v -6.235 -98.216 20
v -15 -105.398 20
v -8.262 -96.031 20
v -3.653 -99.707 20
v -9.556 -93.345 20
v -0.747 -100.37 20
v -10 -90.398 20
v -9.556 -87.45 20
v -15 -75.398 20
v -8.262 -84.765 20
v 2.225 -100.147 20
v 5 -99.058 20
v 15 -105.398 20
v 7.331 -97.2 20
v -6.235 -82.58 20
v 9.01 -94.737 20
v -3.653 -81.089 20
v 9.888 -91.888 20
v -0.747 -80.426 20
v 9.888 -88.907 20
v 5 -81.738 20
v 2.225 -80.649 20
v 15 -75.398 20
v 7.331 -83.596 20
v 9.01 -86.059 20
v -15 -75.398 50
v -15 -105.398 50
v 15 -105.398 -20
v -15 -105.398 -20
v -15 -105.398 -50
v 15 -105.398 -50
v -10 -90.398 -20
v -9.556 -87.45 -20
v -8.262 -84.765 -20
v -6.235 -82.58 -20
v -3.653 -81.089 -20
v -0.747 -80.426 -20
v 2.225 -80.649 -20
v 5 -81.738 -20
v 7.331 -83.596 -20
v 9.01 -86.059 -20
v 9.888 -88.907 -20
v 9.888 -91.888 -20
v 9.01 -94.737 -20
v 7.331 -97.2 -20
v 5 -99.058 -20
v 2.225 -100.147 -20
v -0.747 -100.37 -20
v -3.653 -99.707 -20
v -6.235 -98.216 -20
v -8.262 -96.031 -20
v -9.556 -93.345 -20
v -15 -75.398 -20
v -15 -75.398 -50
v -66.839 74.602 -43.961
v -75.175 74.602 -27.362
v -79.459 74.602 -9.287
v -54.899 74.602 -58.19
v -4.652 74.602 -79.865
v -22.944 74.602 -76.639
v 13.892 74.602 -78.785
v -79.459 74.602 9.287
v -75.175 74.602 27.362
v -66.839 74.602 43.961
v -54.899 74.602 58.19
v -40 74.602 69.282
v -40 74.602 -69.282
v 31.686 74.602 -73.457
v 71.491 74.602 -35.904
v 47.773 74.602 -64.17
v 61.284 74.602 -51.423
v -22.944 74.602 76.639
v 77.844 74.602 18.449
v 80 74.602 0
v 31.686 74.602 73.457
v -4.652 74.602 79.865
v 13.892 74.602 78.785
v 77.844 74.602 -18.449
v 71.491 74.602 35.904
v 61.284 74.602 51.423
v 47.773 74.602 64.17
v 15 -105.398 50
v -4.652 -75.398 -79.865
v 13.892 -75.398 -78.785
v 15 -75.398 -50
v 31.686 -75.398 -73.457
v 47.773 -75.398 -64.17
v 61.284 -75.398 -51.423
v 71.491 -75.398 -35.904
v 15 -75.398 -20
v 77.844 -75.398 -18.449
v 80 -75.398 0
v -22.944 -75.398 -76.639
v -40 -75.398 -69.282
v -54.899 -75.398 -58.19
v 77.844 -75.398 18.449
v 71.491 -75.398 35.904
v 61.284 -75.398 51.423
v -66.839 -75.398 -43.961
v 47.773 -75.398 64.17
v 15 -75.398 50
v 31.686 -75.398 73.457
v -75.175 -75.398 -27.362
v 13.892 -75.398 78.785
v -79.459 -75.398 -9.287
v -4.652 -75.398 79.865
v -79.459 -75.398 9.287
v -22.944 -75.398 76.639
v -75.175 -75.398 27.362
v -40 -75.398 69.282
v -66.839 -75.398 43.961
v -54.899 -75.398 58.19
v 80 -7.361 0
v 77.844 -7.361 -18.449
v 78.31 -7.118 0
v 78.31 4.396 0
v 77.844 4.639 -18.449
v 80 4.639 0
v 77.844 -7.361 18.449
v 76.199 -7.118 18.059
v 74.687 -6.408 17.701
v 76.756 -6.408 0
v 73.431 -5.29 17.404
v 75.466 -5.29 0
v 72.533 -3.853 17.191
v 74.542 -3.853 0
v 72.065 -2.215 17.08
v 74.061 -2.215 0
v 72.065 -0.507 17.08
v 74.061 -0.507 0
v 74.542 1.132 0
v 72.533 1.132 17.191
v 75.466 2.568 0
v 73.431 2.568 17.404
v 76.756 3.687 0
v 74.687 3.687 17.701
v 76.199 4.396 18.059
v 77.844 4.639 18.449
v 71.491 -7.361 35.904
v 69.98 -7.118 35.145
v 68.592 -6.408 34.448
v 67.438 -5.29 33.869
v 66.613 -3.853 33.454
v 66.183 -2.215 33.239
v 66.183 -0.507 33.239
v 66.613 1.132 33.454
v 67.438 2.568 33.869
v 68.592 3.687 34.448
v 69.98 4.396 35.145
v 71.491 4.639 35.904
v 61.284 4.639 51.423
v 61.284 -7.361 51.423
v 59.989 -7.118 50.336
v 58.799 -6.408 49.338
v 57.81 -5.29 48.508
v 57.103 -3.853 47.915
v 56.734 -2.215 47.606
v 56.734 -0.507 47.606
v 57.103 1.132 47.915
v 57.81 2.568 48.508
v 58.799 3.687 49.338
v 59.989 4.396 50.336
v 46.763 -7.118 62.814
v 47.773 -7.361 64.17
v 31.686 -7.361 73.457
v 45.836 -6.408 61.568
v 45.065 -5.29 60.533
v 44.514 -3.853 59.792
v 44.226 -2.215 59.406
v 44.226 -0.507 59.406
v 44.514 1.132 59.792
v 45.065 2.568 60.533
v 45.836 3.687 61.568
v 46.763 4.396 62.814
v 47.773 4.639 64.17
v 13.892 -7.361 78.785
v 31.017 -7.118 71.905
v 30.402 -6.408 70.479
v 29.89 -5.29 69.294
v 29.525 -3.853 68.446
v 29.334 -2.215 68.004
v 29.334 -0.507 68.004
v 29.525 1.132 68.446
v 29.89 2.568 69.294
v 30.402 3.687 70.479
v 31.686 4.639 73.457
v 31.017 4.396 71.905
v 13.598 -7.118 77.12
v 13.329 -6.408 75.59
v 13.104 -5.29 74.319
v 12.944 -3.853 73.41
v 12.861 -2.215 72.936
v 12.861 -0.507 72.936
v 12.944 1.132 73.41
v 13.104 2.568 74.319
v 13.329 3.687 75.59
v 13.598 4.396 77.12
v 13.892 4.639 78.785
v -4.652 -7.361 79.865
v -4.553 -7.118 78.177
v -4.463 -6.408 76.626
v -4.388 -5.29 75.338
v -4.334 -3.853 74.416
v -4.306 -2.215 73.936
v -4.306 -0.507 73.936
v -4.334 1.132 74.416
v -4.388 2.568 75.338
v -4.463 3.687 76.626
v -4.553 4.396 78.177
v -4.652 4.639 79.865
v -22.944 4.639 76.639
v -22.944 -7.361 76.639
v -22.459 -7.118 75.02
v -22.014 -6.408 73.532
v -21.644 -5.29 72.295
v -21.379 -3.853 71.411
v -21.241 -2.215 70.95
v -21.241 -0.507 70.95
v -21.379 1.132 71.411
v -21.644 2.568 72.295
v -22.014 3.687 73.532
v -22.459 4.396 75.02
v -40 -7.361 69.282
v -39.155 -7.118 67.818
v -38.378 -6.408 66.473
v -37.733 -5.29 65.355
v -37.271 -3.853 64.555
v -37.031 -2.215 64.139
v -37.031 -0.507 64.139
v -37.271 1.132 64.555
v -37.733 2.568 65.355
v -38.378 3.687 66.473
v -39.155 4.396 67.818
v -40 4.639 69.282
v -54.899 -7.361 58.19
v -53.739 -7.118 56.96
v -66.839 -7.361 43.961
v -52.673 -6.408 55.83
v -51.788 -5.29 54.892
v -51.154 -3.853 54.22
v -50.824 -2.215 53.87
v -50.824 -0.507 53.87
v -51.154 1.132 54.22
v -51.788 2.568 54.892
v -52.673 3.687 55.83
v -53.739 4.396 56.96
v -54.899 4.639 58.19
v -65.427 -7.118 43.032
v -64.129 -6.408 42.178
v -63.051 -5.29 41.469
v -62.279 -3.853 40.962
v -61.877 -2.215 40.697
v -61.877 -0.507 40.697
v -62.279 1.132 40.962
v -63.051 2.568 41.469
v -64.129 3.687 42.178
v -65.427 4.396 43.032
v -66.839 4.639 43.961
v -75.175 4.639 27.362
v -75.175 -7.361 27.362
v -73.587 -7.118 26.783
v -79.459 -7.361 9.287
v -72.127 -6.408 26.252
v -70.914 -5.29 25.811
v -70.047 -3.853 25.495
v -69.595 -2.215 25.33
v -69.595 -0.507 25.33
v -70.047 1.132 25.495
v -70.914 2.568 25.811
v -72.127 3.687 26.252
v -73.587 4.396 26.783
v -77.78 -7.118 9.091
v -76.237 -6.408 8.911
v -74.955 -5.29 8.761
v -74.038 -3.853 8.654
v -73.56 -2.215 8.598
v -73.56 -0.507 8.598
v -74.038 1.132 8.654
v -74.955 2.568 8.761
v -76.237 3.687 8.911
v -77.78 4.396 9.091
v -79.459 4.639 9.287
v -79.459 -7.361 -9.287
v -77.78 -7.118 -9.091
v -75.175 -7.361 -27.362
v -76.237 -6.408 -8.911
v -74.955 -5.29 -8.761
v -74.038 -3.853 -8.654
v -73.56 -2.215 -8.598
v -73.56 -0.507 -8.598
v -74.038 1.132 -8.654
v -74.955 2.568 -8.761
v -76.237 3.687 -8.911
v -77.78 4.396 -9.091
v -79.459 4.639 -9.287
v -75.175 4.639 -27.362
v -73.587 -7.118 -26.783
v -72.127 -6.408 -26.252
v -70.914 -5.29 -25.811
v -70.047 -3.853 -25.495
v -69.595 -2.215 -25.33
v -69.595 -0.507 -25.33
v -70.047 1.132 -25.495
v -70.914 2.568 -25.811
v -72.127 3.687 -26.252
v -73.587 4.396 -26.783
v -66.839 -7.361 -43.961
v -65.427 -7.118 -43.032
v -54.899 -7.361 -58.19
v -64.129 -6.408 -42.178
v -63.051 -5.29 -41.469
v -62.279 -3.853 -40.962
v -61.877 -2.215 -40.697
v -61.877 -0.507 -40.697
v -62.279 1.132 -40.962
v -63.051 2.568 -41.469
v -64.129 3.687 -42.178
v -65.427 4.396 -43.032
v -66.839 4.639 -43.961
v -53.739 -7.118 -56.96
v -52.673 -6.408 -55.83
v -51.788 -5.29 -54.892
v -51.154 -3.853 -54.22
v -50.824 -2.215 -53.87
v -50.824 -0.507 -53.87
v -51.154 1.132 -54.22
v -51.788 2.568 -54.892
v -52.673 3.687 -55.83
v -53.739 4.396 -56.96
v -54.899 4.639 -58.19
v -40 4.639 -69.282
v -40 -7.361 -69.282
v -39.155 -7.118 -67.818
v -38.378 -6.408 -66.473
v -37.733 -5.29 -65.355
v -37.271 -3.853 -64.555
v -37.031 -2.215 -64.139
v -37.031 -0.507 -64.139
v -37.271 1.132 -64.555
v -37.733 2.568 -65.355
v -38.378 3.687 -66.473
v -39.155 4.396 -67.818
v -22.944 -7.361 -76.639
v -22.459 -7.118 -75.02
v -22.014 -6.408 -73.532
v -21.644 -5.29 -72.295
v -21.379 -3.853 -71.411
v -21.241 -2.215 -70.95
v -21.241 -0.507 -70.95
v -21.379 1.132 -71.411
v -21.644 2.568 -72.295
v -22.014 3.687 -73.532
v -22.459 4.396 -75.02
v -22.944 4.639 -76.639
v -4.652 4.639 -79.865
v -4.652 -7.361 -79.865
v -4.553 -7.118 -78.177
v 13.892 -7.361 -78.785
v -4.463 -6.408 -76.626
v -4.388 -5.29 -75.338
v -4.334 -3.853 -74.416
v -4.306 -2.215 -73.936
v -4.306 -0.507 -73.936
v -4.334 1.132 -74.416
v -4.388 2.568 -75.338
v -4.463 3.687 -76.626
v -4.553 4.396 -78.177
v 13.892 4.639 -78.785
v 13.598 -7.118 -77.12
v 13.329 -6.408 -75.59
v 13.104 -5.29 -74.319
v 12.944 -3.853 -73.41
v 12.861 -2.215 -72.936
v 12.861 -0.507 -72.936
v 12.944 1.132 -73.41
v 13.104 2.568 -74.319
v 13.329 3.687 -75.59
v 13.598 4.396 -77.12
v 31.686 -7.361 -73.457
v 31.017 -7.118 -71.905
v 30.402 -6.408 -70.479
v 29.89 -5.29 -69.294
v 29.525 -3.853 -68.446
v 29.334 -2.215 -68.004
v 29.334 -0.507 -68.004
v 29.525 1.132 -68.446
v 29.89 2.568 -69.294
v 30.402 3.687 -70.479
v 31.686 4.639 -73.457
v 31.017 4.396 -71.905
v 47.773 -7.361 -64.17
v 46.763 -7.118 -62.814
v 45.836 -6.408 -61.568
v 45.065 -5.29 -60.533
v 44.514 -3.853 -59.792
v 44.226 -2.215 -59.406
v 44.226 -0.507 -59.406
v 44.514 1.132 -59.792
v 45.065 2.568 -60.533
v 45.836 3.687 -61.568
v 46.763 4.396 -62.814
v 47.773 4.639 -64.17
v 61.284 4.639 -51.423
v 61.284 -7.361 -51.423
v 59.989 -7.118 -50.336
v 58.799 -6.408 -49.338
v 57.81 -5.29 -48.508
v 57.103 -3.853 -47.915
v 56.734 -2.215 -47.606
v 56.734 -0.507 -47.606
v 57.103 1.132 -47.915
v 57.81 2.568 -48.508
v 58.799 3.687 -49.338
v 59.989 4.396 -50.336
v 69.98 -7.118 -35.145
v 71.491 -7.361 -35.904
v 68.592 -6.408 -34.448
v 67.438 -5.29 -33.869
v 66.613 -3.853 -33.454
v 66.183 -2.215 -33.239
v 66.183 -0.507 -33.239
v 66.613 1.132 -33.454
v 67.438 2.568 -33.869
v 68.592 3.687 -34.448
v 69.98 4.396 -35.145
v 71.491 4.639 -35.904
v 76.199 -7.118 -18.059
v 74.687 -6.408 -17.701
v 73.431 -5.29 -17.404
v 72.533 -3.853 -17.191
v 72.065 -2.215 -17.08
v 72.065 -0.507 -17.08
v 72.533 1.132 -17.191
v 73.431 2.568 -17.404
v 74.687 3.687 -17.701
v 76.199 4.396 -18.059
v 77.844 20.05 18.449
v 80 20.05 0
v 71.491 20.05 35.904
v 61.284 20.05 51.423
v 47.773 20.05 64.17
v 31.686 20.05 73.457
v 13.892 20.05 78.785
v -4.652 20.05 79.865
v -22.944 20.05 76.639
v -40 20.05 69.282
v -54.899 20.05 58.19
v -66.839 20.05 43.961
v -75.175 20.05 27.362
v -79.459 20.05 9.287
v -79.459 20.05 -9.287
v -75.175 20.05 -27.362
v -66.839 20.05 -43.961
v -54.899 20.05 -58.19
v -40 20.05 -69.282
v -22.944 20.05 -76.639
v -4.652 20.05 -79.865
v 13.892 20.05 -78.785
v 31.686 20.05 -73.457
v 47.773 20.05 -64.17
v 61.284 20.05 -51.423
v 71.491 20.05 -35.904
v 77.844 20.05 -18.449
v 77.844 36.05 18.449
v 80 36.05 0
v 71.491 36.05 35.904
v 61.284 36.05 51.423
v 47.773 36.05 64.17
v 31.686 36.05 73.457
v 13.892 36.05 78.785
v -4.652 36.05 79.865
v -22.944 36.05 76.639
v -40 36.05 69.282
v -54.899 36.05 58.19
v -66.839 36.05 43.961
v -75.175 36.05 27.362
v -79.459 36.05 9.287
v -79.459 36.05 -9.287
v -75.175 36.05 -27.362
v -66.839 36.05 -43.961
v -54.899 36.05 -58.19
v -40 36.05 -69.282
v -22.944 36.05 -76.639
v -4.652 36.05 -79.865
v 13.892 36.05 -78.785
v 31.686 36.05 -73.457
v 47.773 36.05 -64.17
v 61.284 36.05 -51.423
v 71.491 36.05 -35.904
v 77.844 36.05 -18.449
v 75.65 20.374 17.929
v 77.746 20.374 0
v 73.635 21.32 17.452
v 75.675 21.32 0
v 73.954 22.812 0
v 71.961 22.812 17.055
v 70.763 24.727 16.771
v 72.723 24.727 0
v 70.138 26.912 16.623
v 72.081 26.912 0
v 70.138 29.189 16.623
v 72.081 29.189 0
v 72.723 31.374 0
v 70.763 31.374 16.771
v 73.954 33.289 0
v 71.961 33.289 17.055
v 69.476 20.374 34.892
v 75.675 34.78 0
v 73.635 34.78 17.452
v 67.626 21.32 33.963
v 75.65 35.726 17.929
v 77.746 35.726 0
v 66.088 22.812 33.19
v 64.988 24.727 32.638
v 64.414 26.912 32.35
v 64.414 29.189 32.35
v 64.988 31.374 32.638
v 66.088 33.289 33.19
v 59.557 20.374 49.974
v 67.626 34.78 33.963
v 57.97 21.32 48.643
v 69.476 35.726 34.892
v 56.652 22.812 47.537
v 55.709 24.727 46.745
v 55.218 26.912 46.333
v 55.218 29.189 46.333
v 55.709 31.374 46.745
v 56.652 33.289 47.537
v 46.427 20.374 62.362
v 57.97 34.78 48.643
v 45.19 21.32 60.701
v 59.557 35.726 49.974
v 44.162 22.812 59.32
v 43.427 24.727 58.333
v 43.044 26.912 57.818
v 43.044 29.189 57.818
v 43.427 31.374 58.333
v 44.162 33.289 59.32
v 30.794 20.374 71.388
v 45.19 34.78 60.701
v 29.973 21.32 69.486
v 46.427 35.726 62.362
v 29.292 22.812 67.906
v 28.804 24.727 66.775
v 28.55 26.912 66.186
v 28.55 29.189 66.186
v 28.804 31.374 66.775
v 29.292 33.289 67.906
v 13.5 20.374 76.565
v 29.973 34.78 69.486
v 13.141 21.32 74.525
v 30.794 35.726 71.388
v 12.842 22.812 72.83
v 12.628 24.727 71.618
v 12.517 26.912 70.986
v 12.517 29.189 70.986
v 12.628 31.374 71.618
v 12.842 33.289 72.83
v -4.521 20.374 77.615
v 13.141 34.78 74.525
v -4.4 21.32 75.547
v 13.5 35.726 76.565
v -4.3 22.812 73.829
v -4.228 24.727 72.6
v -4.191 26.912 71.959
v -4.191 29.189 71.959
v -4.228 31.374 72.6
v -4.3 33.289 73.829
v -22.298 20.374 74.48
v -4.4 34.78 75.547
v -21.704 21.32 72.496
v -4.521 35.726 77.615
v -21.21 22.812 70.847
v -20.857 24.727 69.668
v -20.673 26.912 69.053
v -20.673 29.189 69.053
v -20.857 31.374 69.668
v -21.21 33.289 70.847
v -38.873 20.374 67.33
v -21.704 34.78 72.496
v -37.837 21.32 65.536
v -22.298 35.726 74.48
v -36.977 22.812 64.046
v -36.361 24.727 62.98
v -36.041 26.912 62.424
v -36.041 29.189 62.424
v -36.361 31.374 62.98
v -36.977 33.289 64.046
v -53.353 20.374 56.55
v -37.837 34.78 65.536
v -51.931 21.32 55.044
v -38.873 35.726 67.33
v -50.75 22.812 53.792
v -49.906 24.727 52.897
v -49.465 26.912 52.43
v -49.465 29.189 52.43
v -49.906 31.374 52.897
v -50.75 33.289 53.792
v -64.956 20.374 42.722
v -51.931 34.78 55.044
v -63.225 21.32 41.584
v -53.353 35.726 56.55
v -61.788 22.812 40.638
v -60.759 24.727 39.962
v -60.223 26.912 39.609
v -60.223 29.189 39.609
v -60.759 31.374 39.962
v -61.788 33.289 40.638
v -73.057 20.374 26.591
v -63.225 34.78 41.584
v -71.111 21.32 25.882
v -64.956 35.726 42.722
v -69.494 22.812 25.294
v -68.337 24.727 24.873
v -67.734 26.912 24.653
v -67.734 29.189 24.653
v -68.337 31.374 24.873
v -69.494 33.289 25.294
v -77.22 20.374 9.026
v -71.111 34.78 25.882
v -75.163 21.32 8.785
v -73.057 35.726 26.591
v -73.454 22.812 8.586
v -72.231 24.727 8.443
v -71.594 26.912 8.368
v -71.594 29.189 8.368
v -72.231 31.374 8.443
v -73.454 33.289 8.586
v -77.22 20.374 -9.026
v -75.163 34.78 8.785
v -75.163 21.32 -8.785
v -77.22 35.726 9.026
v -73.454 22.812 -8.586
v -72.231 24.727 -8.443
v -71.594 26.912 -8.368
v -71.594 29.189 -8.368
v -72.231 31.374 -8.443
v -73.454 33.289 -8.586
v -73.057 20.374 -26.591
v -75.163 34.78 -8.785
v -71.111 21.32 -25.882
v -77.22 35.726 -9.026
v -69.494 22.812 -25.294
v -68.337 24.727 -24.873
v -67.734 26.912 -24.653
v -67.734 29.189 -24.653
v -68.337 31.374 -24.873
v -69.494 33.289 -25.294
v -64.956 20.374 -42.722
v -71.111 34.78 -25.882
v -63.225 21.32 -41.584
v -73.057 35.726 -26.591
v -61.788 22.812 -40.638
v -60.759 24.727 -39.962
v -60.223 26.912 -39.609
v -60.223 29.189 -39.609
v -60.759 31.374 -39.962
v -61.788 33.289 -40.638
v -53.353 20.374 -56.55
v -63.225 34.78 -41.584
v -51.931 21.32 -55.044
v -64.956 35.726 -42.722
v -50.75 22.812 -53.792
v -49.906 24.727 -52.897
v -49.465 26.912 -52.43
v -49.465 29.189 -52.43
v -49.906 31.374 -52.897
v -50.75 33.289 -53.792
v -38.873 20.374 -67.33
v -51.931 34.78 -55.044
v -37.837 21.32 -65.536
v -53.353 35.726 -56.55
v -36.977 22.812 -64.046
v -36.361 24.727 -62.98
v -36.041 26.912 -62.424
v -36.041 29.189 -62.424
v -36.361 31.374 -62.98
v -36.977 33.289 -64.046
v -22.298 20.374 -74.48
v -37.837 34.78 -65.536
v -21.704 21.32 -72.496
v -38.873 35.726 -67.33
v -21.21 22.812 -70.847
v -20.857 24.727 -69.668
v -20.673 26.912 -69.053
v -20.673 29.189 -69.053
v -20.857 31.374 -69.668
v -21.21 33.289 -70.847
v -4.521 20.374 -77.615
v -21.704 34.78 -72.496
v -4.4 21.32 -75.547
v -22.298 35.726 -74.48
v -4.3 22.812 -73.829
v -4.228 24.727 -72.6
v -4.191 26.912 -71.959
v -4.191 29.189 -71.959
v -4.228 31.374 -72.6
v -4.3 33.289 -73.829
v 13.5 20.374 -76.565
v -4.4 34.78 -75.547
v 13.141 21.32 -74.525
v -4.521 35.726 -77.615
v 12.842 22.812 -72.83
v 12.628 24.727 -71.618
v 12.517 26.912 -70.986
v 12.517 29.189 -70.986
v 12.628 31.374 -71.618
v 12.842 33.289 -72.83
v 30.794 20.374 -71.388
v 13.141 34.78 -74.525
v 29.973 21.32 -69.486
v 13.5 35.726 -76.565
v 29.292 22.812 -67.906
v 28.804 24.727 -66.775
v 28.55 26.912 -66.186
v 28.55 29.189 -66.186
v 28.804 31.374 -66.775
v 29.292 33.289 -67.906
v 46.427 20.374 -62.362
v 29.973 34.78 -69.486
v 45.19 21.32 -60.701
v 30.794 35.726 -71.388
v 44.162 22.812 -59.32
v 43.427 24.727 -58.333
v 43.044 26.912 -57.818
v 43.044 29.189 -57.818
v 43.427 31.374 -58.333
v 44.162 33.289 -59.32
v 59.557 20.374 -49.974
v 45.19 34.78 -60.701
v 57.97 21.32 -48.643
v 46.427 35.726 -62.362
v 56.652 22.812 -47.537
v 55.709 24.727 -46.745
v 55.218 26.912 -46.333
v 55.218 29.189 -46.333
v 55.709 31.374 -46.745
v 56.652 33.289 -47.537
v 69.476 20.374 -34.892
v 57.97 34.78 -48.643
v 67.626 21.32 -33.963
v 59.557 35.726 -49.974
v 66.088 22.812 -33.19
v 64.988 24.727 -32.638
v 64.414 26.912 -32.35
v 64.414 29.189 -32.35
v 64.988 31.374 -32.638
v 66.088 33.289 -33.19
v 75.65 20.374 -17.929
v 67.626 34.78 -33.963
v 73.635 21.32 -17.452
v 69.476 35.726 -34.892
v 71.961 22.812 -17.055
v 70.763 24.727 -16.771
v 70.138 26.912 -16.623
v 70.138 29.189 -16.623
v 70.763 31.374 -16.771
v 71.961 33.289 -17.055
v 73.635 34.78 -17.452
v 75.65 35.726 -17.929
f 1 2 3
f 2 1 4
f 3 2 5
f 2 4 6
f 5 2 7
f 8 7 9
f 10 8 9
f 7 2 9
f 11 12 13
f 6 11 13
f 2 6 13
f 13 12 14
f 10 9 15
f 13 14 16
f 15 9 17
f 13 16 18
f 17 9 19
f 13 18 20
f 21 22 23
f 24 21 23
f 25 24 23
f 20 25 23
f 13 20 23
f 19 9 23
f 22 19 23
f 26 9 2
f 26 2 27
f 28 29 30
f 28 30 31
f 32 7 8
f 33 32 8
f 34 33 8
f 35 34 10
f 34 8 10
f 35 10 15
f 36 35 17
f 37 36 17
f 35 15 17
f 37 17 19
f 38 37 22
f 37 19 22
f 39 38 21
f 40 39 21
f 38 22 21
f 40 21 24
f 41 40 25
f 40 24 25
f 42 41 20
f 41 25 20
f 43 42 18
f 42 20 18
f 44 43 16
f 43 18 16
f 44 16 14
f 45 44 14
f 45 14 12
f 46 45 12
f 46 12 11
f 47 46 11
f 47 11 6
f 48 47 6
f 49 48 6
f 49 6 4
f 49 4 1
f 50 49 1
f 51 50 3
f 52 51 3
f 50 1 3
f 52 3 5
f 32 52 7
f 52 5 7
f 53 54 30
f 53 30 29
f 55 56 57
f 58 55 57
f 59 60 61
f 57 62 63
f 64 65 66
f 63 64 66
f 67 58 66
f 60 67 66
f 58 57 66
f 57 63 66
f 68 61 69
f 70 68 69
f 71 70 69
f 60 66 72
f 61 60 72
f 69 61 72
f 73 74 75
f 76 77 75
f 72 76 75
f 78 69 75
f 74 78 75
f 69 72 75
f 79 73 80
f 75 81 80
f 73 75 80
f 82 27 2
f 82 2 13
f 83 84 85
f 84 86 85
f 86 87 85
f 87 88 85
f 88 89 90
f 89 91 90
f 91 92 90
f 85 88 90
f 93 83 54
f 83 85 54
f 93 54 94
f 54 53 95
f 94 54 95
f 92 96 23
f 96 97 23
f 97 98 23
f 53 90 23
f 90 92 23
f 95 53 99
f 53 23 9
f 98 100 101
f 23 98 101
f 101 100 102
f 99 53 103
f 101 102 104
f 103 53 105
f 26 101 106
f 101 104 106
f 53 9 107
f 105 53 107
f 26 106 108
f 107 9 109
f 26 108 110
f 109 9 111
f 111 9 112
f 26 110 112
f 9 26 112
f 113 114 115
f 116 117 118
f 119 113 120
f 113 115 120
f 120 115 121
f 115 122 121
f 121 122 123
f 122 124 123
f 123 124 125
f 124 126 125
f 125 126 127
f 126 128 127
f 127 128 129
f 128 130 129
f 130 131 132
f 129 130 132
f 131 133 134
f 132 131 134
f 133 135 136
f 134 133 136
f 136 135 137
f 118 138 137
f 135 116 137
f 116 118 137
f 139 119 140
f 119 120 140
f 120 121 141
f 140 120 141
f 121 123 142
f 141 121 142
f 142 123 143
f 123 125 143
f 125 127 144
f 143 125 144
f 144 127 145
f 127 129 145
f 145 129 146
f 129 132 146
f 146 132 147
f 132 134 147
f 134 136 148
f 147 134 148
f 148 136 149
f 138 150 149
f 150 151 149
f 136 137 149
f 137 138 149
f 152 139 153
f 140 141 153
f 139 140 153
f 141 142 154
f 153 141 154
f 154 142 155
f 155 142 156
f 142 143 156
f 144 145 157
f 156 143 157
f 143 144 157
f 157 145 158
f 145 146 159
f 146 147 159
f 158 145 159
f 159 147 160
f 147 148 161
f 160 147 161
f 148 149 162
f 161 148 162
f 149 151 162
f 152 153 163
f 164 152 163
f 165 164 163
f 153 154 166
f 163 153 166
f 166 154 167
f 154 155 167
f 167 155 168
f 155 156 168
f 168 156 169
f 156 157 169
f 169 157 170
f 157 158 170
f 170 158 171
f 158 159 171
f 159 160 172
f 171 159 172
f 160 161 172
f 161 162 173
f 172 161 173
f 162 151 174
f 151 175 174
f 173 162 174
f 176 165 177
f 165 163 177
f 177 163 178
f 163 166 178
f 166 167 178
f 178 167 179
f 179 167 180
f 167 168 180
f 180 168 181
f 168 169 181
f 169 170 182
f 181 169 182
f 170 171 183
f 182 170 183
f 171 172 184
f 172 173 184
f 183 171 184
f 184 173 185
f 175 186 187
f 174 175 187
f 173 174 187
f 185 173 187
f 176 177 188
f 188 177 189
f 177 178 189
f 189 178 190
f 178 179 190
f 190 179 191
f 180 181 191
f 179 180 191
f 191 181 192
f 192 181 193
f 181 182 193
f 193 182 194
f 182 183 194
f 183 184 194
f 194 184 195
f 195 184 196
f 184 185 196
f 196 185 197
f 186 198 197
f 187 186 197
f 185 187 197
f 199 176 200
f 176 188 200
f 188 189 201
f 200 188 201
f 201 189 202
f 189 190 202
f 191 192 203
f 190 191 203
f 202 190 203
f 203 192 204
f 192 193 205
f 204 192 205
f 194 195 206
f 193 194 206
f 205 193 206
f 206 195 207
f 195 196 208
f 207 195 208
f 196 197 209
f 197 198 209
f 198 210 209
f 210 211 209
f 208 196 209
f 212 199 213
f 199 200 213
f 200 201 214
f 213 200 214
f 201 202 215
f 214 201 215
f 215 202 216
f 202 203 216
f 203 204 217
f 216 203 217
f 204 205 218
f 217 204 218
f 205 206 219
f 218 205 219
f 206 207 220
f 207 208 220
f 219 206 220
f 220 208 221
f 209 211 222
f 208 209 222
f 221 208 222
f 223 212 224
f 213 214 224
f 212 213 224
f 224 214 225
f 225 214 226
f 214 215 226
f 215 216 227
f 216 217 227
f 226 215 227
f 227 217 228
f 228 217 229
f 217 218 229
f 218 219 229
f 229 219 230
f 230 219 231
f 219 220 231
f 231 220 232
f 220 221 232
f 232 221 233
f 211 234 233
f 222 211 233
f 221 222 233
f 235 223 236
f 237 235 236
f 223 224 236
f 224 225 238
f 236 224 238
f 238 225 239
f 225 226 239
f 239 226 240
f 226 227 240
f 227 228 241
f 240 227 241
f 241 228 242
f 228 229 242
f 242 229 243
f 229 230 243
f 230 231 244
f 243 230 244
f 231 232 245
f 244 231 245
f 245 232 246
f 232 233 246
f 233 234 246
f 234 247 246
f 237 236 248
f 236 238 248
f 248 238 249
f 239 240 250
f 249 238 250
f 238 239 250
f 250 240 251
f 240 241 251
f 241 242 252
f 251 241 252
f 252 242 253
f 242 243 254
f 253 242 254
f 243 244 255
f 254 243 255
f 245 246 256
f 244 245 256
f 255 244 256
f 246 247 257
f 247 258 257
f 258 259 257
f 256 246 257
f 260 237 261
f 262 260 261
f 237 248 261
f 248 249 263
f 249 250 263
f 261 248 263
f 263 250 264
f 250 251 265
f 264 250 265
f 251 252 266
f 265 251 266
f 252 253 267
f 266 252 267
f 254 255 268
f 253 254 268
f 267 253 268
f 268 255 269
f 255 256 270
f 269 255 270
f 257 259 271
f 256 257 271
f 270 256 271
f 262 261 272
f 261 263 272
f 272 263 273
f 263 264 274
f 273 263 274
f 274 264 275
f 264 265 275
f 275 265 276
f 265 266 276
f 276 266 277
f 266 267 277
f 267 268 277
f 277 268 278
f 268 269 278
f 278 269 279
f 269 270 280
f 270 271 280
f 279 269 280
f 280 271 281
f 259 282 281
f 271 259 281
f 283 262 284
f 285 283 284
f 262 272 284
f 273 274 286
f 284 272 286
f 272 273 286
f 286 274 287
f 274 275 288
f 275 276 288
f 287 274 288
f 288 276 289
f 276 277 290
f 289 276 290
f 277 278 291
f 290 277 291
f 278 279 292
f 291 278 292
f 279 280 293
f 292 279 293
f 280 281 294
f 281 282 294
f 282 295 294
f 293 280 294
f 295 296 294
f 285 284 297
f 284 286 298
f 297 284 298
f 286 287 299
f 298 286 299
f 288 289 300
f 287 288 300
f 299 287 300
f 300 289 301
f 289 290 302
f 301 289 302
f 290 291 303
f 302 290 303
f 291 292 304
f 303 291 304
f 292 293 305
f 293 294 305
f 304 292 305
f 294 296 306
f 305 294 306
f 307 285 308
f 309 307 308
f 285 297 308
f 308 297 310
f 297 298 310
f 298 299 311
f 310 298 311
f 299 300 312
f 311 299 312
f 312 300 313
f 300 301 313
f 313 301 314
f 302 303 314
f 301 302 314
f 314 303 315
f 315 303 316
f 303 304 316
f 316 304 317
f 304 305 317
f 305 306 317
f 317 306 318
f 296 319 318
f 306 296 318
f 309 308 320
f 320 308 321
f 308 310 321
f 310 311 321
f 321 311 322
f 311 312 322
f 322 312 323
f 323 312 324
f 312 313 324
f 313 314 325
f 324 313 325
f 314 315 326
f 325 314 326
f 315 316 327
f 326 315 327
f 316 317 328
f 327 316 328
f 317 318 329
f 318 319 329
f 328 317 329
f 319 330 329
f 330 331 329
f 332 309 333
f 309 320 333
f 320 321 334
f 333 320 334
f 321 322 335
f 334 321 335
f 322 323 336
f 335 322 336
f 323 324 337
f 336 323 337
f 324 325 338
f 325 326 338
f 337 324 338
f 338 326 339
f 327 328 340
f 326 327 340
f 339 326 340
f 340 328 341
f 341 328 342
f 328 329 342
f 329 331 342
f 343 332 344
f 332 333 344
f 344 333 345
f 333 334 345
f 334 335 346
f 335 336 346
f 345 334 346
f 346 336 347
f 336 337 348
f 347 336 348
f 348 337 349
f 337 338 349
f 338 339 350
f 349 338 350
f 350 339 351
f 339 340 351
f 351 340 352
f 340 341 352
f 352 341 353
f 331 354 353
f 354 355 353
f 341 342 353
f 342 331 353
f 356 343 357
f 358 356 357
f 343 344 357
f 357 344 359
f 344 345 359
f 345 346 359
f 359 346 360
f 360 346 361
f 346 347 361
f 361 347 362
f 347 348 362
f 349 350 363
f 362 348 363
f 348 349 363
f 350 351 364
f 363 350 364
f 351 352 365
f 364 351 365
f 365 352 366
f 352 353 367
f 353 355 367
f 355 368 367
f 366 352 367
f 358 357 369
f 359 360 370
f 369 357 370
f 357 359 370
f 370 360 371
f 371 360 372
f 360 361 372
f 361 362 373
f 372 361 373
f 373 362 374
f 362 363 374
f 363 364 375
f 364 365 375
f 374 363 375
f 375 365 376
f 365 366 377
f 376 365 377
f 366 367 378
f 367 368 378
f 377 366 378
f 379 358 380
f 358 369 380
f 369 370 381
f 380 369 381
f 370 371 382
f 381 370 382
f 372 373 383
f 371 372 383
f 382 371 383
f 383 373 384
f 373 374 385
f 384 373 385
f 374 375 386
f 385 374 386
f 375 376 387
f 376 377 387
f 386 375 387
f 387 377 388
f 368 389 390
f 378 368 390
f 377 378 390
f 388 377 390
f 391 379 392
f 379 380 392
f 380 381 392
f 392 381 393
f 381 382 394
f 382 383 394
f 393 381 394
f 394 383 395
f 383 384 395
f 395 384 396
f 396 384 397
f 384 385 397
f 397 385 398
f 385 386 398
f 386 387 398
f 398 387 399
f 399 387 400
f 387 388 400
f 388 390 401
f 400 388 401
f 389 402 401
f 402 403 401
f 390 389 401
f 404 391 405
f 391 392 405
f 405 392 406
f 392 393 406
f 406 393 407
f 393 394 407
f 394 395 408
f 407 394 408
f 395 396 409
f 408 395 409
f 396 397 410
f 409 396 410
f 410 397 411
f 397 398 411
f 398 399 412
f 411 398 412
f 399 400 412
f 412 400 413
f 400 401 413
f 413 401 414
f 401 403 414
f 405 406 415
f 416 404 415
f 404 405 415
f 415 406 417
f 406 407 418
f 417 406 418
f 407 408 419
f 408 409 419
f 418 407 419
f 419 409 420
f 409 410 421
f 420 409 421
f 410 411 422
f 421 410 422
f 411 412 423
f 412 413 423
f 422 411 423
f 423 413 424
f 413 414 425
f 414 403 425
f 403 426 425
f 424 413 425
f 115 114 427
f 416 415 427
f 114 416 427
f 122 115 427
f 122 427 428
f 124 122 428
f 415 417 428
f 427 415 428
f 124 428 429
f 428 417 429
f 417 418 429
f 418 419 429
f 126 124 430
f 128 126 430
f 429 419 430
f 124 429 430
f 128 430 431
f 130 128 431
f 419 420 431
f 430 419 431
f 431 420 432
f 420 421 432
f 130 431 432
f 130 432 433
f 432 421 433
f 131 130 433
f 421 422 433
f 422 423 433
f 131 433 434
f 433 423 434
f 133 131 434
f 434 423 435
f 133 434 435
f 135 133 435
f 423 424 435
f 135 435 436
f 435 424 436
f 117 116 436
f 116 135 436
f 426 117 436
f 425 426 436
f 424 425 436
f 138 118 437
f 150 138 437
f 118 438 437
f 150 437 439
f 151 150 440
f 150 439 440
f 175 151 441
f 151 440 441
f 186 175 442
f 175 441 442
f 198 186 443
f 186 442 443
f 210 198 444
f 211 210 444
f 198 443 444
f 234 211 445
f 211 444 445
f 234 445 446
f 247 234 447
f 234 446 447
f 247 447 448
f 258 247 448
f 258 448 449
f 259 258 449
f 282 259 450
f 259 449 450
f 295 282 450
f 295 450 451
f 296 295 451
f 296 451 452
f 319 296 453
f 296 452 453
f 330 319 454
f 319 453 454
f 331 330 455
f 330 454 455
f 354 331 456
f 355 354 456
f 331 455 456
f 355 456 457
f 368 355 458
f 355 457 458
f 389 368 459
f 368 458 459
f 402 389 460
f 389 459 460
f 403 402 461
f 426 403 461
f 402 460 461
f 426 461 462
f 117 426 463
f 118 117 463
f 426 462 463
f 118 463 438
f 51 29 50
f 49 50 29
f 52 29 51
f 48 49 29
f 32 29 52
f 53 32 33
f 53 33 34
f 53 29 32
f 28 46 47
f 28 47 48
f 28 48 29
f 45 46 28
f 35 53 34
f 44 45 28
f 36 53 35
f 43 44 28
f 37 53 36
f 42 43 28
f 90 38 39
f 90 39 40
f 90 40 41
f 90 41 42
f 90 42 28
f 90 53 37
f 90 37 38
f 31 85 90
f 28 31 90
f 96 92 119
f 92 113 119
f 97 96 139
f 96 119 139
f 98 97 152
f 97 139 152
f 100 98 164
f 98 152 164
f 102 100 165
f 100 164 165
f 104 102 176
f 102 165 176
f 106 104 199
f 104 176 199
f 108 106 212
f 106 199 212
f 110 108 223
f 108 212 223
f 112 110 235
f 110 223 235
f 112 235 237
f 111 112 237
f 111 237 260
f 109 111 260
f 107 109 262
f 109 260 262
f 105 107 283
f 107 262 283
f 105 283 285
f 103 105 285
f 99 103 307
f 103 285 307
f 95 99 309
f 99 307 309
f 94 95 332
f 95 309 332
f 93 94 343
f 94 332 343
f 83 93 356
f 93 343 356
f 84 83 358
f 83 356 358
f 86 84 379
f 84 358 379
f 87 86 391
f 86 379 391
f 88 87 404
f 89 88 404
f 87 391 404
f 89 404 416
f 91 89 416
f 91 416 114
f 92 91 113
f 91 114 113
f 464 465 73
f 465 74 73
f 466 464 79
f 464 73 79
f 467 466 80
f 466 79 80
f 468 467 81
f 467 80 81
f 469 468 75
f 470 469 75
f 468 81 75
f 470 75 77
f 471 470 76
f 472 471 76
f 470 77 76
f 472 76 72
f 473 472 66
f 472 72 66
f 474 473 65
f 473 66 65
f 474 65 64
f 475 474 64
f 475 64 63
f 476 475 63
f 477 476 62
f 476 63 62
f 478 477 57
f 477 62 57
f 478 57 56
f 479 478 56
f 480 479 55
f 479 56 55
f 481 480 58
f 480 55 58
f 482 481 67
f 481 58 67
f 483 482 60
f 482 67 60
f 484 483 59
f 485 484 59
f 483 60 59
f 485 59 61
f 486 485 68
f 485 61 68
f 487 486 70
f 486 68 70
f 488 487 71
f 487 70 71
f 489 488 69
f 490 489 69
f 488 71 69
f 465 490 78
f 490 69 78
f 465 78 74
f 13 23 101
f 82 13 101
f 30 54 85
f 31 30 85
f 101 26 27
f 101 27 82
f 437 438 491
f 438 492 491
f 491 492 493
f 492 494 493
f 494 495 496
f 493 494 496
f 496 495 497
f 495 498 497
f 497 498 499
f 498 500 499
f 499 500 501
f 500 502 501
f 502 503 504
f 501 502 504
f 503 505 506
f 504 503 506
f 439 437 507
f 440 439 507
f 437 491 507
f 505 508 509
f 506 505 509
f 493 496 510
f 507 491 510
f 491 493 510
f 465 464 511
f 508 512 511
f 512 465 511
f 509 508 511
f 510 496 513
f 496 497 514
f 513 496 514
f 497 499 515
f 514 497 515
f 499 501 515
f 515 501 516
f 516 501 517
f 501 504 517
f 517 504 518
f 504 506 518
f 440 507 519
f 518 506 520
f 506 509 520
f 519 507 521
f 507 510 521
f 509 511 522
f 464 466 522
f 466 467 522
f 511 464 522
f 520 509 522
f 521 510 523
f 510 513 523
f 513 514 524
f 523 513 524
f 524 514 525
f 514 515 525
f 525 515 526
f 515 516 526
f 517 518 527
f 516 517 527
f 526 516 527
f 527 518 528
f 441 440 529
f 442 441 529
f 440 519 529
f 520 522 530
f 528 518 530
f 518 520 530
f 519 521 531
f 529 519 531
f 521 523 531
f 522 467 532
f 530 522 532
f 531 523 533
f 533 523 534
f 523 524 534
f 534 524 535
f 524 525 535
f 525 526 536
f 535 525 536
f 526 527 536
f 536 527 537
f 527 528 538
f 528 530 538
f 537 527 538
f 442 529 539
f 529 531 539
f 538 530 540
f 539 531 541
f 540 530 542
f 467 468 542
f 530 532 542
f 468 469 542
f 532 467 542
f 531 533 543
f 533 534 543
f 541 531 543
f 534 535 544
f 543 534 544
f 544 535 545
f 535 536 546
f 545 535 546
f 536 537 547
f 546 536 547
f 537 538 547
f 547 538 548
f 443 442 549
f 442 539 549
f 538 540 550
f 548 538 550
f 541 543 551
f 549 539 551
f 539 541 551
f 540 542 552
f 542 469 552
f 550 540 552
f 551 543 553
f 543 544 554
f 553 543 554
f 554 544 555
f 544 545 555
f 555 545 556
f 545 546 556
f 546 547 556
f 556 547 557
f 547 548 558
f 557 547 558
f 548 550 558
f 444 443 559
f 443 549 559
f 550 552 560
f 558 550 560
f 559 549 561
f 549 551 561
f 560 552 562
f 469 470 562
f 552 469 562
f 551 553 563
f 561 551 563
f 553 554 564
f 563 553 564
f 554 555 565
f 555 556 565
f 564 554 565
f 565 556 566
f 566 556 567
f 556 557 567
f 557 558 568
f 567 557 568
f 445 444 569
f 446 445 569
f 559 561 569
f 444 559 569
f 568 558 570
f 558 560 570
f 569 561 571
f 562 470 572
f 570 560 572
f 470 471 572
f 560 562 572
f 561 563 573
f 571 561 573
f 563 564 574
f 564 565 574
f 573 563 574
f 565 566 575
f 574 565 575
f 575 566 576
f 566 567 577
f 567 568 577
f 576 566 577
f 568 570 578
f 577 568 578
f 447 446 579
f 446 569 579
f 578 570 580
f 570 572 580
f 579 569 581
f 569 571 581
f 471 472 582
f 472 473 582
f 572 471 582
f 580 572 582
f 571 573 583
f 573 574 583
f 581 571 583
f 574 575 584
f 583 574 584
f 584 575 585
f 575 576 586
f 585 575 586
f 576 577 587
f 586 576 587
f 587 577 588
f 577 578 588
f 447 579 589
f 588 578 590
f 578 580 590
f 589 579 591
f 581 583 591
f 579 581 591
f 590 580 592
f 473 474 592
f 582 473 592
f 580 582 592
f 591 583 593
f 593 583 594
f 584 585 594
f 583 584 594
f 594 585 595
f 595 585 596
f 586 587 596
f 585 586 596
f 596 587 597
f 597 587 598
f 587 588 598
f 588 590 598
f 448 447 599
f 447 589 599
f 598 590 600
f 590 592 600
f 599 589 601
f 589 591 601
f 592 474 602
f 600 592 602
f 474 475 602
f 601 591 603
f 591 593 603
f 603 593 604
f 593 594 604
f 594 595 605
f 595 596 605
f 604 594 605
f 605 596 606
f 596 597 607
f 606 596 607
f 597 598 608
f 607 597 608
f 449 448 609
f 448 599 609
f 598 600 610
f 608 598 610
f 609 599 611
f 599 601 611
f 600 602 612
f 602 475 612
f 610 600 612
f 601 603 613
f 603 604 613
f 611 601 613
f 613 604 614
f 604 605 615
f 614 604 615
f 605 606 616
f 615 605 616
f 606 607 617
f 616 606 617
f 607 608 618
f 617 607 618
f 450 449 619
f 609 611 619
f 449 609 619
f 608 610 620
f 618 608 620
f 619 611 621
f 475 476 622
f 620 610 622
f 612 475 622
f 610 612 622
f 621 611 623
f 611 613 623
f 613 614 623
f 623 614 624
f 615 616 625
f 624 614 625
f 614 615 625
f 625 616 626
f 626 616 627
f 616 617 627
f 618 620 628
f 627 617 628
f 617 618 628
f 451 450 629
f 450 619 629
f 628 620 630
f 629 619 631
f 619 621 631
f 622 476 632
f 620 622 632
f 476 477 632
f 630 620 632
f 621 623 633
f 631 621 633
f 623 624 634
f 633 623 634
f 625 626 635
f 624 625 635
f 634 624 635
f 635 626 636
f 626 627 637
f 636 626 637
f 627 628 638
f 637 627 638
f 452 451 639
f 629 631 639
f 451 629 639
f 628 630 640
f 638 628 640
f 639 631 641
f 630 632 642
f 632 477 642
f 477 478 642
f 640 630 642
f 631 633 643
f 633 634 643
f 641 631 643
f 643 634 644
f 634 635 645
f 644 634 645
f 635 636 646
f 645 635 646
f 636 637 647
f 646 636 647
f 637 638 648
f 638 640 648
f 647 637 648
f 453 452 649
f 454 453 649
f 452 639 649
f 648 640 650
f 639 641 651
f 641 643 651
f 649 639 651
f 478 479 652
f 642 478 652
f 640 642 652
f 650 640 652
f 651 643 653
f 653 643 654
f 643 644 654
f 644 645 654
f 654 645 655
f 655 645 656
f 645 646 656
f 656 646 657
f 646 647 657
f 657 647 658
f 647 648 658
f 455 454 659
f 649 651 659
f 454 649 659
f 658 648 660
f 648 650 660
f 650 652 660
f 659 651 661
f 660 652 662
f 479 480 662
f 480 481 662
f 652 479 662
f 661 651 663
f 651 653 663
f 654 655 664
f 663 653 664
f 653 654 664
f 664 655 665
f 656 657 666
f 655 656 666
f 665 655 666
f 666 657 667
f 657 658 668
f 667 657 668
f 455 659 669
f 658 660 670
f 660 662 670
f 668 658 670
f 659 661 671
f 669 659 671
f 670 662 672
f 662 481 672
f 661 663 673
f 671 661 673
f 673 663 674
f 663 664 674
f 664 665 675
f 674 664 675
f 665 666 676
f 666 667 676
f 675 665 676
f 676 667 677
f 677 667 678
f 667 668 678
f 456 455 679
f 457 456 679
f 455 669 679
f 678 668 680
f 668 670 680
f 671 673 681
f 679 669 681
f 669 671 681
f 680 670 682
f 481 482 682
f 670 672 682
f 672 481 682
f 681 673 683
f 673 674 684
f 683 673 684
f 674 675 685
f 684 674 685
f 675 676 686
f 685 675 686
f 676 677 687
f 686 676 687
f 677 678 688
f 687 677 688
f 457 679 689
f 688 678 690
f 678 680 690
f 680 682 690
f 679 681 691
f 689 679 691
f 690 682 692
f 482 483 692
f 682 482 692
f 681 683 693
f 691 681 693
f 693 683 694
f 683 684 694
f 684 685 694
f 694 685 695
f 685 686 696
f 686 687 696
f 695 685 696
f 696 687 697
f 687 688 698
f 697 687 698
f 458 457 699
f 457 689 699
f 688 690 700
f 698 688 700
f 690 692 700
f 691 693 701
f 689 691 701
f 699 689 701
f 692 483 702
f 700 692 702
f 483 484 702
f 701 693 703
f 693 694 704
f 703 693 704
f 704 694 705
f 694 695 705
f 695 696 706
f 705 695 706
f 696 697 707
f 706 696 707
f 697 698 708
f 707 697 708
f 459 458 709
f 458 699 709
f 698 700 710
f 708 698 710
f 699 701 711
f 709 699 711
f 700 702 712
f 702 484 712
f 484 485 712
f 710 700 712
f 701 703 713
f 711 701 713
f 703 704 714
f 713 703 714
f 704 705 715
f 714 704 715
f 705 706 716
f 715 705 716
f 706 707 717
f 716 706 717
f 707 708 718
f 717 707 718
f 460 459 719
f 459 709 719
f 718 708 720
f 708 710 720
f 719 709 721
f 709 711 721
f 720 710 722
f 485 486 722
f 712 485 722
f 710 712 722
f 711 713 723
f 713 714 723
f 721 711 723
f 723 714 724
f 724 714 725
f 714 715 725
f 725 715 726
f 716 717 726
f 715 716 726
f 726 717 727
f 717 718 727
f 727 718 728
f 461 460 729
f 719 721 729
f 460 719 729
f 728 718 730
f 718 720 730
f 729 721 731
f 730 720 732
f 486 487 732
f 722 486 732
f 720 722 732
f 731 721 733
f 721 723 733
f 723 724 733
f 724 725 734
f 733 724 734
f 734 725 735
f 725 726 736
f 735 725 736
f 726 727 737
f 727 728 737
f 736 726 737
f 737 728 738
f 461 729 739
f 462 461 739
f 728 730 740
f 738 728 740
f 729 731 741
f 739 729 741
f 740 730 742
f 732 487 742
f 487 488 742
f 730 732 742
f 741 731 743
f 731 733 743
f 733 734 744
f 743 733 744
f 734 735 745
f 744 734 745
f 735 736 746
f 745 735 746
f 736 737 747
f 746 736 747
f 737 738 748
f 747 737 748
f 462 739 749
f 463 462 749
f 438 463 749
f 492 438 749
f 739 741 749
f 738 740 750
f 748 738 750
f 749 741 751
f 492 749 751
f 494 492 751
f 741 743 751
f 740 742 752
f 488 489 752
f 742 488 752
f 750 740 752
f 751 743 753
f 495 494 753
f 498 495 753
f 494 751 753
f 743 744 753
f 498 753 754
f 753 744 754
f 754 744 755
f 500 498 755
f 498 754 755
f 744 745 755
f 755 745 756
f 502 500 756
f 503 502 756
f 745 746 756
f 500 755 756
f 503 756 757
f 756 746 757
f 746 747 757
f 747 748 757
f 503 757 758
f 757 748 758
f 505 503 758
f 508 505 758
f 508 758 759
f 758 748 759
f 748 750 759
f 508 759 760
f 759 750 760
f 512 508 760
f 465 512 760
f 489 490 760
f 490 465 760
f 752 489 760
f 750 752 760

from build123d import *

# Parameters (mm, degrees)
SKETCH3_W           = 30
SKETCH3_H           = 30
BOSS_EXTRUDE1_DEPTH = 30
SKETCH4_R           = 10
BOSS_EXTRUDE2_DEPTH = 40


with BuildPart() as part:
    # Sketch1 → Revolve1 (revolve)
    with BuildSketch(Plane.XY):
        with BuildLine():
            Line((0, 74.602122016), (0, -75.397877984))
            Line((0, -75.397877984), (80, -75.397877984))
            Line((80, -75.397877984), (80, -7.360742706))
            ThreePointArc((80, -7.360742706), (74, -1.360742706), (80, 4.639257294))
            Line((80, 4.639257294), (80, 20.050397878))
            ThreePointArc((80, 20.050397878), (72, 28.050397878), (80, 36.050397878))
            Line((80, 36.050397878), (80, 74.602122016))
            Line((80, 74.602122016), (0, 74.602122016))
        make_face()
    revolve(axis=Axis((0, 74.602122016, 0), (0, -1, 0)))

    # Sketch3 → Boss-Extrude1 (add)
    with BuildSketch(Plane.XZ.offset(75.397877984)):
        with Locations((0, -35)):
            Rectangle(SKETCH3_W, SKETCH3_H)
        with Locations((0, 35)):
            Rectangle(SKETCH3_W, SKETCH3_H)
    extrude(amount=BOSS_EXTRUDE1_DEPTH)

    # Sketch4 → Boss-Extrude2 (add)
    with BuildSketch(Plane(origin=(0, 0, 20), x_dir=(-1, 0, 0), z_dir=(0, 0, -1))):
        with Locations((0, -90.397877984)):
            Circle(SKETCH4_R)
    extrude(amount=BOSS_EXTRUDE2_DEPTH)


solid = part.part
